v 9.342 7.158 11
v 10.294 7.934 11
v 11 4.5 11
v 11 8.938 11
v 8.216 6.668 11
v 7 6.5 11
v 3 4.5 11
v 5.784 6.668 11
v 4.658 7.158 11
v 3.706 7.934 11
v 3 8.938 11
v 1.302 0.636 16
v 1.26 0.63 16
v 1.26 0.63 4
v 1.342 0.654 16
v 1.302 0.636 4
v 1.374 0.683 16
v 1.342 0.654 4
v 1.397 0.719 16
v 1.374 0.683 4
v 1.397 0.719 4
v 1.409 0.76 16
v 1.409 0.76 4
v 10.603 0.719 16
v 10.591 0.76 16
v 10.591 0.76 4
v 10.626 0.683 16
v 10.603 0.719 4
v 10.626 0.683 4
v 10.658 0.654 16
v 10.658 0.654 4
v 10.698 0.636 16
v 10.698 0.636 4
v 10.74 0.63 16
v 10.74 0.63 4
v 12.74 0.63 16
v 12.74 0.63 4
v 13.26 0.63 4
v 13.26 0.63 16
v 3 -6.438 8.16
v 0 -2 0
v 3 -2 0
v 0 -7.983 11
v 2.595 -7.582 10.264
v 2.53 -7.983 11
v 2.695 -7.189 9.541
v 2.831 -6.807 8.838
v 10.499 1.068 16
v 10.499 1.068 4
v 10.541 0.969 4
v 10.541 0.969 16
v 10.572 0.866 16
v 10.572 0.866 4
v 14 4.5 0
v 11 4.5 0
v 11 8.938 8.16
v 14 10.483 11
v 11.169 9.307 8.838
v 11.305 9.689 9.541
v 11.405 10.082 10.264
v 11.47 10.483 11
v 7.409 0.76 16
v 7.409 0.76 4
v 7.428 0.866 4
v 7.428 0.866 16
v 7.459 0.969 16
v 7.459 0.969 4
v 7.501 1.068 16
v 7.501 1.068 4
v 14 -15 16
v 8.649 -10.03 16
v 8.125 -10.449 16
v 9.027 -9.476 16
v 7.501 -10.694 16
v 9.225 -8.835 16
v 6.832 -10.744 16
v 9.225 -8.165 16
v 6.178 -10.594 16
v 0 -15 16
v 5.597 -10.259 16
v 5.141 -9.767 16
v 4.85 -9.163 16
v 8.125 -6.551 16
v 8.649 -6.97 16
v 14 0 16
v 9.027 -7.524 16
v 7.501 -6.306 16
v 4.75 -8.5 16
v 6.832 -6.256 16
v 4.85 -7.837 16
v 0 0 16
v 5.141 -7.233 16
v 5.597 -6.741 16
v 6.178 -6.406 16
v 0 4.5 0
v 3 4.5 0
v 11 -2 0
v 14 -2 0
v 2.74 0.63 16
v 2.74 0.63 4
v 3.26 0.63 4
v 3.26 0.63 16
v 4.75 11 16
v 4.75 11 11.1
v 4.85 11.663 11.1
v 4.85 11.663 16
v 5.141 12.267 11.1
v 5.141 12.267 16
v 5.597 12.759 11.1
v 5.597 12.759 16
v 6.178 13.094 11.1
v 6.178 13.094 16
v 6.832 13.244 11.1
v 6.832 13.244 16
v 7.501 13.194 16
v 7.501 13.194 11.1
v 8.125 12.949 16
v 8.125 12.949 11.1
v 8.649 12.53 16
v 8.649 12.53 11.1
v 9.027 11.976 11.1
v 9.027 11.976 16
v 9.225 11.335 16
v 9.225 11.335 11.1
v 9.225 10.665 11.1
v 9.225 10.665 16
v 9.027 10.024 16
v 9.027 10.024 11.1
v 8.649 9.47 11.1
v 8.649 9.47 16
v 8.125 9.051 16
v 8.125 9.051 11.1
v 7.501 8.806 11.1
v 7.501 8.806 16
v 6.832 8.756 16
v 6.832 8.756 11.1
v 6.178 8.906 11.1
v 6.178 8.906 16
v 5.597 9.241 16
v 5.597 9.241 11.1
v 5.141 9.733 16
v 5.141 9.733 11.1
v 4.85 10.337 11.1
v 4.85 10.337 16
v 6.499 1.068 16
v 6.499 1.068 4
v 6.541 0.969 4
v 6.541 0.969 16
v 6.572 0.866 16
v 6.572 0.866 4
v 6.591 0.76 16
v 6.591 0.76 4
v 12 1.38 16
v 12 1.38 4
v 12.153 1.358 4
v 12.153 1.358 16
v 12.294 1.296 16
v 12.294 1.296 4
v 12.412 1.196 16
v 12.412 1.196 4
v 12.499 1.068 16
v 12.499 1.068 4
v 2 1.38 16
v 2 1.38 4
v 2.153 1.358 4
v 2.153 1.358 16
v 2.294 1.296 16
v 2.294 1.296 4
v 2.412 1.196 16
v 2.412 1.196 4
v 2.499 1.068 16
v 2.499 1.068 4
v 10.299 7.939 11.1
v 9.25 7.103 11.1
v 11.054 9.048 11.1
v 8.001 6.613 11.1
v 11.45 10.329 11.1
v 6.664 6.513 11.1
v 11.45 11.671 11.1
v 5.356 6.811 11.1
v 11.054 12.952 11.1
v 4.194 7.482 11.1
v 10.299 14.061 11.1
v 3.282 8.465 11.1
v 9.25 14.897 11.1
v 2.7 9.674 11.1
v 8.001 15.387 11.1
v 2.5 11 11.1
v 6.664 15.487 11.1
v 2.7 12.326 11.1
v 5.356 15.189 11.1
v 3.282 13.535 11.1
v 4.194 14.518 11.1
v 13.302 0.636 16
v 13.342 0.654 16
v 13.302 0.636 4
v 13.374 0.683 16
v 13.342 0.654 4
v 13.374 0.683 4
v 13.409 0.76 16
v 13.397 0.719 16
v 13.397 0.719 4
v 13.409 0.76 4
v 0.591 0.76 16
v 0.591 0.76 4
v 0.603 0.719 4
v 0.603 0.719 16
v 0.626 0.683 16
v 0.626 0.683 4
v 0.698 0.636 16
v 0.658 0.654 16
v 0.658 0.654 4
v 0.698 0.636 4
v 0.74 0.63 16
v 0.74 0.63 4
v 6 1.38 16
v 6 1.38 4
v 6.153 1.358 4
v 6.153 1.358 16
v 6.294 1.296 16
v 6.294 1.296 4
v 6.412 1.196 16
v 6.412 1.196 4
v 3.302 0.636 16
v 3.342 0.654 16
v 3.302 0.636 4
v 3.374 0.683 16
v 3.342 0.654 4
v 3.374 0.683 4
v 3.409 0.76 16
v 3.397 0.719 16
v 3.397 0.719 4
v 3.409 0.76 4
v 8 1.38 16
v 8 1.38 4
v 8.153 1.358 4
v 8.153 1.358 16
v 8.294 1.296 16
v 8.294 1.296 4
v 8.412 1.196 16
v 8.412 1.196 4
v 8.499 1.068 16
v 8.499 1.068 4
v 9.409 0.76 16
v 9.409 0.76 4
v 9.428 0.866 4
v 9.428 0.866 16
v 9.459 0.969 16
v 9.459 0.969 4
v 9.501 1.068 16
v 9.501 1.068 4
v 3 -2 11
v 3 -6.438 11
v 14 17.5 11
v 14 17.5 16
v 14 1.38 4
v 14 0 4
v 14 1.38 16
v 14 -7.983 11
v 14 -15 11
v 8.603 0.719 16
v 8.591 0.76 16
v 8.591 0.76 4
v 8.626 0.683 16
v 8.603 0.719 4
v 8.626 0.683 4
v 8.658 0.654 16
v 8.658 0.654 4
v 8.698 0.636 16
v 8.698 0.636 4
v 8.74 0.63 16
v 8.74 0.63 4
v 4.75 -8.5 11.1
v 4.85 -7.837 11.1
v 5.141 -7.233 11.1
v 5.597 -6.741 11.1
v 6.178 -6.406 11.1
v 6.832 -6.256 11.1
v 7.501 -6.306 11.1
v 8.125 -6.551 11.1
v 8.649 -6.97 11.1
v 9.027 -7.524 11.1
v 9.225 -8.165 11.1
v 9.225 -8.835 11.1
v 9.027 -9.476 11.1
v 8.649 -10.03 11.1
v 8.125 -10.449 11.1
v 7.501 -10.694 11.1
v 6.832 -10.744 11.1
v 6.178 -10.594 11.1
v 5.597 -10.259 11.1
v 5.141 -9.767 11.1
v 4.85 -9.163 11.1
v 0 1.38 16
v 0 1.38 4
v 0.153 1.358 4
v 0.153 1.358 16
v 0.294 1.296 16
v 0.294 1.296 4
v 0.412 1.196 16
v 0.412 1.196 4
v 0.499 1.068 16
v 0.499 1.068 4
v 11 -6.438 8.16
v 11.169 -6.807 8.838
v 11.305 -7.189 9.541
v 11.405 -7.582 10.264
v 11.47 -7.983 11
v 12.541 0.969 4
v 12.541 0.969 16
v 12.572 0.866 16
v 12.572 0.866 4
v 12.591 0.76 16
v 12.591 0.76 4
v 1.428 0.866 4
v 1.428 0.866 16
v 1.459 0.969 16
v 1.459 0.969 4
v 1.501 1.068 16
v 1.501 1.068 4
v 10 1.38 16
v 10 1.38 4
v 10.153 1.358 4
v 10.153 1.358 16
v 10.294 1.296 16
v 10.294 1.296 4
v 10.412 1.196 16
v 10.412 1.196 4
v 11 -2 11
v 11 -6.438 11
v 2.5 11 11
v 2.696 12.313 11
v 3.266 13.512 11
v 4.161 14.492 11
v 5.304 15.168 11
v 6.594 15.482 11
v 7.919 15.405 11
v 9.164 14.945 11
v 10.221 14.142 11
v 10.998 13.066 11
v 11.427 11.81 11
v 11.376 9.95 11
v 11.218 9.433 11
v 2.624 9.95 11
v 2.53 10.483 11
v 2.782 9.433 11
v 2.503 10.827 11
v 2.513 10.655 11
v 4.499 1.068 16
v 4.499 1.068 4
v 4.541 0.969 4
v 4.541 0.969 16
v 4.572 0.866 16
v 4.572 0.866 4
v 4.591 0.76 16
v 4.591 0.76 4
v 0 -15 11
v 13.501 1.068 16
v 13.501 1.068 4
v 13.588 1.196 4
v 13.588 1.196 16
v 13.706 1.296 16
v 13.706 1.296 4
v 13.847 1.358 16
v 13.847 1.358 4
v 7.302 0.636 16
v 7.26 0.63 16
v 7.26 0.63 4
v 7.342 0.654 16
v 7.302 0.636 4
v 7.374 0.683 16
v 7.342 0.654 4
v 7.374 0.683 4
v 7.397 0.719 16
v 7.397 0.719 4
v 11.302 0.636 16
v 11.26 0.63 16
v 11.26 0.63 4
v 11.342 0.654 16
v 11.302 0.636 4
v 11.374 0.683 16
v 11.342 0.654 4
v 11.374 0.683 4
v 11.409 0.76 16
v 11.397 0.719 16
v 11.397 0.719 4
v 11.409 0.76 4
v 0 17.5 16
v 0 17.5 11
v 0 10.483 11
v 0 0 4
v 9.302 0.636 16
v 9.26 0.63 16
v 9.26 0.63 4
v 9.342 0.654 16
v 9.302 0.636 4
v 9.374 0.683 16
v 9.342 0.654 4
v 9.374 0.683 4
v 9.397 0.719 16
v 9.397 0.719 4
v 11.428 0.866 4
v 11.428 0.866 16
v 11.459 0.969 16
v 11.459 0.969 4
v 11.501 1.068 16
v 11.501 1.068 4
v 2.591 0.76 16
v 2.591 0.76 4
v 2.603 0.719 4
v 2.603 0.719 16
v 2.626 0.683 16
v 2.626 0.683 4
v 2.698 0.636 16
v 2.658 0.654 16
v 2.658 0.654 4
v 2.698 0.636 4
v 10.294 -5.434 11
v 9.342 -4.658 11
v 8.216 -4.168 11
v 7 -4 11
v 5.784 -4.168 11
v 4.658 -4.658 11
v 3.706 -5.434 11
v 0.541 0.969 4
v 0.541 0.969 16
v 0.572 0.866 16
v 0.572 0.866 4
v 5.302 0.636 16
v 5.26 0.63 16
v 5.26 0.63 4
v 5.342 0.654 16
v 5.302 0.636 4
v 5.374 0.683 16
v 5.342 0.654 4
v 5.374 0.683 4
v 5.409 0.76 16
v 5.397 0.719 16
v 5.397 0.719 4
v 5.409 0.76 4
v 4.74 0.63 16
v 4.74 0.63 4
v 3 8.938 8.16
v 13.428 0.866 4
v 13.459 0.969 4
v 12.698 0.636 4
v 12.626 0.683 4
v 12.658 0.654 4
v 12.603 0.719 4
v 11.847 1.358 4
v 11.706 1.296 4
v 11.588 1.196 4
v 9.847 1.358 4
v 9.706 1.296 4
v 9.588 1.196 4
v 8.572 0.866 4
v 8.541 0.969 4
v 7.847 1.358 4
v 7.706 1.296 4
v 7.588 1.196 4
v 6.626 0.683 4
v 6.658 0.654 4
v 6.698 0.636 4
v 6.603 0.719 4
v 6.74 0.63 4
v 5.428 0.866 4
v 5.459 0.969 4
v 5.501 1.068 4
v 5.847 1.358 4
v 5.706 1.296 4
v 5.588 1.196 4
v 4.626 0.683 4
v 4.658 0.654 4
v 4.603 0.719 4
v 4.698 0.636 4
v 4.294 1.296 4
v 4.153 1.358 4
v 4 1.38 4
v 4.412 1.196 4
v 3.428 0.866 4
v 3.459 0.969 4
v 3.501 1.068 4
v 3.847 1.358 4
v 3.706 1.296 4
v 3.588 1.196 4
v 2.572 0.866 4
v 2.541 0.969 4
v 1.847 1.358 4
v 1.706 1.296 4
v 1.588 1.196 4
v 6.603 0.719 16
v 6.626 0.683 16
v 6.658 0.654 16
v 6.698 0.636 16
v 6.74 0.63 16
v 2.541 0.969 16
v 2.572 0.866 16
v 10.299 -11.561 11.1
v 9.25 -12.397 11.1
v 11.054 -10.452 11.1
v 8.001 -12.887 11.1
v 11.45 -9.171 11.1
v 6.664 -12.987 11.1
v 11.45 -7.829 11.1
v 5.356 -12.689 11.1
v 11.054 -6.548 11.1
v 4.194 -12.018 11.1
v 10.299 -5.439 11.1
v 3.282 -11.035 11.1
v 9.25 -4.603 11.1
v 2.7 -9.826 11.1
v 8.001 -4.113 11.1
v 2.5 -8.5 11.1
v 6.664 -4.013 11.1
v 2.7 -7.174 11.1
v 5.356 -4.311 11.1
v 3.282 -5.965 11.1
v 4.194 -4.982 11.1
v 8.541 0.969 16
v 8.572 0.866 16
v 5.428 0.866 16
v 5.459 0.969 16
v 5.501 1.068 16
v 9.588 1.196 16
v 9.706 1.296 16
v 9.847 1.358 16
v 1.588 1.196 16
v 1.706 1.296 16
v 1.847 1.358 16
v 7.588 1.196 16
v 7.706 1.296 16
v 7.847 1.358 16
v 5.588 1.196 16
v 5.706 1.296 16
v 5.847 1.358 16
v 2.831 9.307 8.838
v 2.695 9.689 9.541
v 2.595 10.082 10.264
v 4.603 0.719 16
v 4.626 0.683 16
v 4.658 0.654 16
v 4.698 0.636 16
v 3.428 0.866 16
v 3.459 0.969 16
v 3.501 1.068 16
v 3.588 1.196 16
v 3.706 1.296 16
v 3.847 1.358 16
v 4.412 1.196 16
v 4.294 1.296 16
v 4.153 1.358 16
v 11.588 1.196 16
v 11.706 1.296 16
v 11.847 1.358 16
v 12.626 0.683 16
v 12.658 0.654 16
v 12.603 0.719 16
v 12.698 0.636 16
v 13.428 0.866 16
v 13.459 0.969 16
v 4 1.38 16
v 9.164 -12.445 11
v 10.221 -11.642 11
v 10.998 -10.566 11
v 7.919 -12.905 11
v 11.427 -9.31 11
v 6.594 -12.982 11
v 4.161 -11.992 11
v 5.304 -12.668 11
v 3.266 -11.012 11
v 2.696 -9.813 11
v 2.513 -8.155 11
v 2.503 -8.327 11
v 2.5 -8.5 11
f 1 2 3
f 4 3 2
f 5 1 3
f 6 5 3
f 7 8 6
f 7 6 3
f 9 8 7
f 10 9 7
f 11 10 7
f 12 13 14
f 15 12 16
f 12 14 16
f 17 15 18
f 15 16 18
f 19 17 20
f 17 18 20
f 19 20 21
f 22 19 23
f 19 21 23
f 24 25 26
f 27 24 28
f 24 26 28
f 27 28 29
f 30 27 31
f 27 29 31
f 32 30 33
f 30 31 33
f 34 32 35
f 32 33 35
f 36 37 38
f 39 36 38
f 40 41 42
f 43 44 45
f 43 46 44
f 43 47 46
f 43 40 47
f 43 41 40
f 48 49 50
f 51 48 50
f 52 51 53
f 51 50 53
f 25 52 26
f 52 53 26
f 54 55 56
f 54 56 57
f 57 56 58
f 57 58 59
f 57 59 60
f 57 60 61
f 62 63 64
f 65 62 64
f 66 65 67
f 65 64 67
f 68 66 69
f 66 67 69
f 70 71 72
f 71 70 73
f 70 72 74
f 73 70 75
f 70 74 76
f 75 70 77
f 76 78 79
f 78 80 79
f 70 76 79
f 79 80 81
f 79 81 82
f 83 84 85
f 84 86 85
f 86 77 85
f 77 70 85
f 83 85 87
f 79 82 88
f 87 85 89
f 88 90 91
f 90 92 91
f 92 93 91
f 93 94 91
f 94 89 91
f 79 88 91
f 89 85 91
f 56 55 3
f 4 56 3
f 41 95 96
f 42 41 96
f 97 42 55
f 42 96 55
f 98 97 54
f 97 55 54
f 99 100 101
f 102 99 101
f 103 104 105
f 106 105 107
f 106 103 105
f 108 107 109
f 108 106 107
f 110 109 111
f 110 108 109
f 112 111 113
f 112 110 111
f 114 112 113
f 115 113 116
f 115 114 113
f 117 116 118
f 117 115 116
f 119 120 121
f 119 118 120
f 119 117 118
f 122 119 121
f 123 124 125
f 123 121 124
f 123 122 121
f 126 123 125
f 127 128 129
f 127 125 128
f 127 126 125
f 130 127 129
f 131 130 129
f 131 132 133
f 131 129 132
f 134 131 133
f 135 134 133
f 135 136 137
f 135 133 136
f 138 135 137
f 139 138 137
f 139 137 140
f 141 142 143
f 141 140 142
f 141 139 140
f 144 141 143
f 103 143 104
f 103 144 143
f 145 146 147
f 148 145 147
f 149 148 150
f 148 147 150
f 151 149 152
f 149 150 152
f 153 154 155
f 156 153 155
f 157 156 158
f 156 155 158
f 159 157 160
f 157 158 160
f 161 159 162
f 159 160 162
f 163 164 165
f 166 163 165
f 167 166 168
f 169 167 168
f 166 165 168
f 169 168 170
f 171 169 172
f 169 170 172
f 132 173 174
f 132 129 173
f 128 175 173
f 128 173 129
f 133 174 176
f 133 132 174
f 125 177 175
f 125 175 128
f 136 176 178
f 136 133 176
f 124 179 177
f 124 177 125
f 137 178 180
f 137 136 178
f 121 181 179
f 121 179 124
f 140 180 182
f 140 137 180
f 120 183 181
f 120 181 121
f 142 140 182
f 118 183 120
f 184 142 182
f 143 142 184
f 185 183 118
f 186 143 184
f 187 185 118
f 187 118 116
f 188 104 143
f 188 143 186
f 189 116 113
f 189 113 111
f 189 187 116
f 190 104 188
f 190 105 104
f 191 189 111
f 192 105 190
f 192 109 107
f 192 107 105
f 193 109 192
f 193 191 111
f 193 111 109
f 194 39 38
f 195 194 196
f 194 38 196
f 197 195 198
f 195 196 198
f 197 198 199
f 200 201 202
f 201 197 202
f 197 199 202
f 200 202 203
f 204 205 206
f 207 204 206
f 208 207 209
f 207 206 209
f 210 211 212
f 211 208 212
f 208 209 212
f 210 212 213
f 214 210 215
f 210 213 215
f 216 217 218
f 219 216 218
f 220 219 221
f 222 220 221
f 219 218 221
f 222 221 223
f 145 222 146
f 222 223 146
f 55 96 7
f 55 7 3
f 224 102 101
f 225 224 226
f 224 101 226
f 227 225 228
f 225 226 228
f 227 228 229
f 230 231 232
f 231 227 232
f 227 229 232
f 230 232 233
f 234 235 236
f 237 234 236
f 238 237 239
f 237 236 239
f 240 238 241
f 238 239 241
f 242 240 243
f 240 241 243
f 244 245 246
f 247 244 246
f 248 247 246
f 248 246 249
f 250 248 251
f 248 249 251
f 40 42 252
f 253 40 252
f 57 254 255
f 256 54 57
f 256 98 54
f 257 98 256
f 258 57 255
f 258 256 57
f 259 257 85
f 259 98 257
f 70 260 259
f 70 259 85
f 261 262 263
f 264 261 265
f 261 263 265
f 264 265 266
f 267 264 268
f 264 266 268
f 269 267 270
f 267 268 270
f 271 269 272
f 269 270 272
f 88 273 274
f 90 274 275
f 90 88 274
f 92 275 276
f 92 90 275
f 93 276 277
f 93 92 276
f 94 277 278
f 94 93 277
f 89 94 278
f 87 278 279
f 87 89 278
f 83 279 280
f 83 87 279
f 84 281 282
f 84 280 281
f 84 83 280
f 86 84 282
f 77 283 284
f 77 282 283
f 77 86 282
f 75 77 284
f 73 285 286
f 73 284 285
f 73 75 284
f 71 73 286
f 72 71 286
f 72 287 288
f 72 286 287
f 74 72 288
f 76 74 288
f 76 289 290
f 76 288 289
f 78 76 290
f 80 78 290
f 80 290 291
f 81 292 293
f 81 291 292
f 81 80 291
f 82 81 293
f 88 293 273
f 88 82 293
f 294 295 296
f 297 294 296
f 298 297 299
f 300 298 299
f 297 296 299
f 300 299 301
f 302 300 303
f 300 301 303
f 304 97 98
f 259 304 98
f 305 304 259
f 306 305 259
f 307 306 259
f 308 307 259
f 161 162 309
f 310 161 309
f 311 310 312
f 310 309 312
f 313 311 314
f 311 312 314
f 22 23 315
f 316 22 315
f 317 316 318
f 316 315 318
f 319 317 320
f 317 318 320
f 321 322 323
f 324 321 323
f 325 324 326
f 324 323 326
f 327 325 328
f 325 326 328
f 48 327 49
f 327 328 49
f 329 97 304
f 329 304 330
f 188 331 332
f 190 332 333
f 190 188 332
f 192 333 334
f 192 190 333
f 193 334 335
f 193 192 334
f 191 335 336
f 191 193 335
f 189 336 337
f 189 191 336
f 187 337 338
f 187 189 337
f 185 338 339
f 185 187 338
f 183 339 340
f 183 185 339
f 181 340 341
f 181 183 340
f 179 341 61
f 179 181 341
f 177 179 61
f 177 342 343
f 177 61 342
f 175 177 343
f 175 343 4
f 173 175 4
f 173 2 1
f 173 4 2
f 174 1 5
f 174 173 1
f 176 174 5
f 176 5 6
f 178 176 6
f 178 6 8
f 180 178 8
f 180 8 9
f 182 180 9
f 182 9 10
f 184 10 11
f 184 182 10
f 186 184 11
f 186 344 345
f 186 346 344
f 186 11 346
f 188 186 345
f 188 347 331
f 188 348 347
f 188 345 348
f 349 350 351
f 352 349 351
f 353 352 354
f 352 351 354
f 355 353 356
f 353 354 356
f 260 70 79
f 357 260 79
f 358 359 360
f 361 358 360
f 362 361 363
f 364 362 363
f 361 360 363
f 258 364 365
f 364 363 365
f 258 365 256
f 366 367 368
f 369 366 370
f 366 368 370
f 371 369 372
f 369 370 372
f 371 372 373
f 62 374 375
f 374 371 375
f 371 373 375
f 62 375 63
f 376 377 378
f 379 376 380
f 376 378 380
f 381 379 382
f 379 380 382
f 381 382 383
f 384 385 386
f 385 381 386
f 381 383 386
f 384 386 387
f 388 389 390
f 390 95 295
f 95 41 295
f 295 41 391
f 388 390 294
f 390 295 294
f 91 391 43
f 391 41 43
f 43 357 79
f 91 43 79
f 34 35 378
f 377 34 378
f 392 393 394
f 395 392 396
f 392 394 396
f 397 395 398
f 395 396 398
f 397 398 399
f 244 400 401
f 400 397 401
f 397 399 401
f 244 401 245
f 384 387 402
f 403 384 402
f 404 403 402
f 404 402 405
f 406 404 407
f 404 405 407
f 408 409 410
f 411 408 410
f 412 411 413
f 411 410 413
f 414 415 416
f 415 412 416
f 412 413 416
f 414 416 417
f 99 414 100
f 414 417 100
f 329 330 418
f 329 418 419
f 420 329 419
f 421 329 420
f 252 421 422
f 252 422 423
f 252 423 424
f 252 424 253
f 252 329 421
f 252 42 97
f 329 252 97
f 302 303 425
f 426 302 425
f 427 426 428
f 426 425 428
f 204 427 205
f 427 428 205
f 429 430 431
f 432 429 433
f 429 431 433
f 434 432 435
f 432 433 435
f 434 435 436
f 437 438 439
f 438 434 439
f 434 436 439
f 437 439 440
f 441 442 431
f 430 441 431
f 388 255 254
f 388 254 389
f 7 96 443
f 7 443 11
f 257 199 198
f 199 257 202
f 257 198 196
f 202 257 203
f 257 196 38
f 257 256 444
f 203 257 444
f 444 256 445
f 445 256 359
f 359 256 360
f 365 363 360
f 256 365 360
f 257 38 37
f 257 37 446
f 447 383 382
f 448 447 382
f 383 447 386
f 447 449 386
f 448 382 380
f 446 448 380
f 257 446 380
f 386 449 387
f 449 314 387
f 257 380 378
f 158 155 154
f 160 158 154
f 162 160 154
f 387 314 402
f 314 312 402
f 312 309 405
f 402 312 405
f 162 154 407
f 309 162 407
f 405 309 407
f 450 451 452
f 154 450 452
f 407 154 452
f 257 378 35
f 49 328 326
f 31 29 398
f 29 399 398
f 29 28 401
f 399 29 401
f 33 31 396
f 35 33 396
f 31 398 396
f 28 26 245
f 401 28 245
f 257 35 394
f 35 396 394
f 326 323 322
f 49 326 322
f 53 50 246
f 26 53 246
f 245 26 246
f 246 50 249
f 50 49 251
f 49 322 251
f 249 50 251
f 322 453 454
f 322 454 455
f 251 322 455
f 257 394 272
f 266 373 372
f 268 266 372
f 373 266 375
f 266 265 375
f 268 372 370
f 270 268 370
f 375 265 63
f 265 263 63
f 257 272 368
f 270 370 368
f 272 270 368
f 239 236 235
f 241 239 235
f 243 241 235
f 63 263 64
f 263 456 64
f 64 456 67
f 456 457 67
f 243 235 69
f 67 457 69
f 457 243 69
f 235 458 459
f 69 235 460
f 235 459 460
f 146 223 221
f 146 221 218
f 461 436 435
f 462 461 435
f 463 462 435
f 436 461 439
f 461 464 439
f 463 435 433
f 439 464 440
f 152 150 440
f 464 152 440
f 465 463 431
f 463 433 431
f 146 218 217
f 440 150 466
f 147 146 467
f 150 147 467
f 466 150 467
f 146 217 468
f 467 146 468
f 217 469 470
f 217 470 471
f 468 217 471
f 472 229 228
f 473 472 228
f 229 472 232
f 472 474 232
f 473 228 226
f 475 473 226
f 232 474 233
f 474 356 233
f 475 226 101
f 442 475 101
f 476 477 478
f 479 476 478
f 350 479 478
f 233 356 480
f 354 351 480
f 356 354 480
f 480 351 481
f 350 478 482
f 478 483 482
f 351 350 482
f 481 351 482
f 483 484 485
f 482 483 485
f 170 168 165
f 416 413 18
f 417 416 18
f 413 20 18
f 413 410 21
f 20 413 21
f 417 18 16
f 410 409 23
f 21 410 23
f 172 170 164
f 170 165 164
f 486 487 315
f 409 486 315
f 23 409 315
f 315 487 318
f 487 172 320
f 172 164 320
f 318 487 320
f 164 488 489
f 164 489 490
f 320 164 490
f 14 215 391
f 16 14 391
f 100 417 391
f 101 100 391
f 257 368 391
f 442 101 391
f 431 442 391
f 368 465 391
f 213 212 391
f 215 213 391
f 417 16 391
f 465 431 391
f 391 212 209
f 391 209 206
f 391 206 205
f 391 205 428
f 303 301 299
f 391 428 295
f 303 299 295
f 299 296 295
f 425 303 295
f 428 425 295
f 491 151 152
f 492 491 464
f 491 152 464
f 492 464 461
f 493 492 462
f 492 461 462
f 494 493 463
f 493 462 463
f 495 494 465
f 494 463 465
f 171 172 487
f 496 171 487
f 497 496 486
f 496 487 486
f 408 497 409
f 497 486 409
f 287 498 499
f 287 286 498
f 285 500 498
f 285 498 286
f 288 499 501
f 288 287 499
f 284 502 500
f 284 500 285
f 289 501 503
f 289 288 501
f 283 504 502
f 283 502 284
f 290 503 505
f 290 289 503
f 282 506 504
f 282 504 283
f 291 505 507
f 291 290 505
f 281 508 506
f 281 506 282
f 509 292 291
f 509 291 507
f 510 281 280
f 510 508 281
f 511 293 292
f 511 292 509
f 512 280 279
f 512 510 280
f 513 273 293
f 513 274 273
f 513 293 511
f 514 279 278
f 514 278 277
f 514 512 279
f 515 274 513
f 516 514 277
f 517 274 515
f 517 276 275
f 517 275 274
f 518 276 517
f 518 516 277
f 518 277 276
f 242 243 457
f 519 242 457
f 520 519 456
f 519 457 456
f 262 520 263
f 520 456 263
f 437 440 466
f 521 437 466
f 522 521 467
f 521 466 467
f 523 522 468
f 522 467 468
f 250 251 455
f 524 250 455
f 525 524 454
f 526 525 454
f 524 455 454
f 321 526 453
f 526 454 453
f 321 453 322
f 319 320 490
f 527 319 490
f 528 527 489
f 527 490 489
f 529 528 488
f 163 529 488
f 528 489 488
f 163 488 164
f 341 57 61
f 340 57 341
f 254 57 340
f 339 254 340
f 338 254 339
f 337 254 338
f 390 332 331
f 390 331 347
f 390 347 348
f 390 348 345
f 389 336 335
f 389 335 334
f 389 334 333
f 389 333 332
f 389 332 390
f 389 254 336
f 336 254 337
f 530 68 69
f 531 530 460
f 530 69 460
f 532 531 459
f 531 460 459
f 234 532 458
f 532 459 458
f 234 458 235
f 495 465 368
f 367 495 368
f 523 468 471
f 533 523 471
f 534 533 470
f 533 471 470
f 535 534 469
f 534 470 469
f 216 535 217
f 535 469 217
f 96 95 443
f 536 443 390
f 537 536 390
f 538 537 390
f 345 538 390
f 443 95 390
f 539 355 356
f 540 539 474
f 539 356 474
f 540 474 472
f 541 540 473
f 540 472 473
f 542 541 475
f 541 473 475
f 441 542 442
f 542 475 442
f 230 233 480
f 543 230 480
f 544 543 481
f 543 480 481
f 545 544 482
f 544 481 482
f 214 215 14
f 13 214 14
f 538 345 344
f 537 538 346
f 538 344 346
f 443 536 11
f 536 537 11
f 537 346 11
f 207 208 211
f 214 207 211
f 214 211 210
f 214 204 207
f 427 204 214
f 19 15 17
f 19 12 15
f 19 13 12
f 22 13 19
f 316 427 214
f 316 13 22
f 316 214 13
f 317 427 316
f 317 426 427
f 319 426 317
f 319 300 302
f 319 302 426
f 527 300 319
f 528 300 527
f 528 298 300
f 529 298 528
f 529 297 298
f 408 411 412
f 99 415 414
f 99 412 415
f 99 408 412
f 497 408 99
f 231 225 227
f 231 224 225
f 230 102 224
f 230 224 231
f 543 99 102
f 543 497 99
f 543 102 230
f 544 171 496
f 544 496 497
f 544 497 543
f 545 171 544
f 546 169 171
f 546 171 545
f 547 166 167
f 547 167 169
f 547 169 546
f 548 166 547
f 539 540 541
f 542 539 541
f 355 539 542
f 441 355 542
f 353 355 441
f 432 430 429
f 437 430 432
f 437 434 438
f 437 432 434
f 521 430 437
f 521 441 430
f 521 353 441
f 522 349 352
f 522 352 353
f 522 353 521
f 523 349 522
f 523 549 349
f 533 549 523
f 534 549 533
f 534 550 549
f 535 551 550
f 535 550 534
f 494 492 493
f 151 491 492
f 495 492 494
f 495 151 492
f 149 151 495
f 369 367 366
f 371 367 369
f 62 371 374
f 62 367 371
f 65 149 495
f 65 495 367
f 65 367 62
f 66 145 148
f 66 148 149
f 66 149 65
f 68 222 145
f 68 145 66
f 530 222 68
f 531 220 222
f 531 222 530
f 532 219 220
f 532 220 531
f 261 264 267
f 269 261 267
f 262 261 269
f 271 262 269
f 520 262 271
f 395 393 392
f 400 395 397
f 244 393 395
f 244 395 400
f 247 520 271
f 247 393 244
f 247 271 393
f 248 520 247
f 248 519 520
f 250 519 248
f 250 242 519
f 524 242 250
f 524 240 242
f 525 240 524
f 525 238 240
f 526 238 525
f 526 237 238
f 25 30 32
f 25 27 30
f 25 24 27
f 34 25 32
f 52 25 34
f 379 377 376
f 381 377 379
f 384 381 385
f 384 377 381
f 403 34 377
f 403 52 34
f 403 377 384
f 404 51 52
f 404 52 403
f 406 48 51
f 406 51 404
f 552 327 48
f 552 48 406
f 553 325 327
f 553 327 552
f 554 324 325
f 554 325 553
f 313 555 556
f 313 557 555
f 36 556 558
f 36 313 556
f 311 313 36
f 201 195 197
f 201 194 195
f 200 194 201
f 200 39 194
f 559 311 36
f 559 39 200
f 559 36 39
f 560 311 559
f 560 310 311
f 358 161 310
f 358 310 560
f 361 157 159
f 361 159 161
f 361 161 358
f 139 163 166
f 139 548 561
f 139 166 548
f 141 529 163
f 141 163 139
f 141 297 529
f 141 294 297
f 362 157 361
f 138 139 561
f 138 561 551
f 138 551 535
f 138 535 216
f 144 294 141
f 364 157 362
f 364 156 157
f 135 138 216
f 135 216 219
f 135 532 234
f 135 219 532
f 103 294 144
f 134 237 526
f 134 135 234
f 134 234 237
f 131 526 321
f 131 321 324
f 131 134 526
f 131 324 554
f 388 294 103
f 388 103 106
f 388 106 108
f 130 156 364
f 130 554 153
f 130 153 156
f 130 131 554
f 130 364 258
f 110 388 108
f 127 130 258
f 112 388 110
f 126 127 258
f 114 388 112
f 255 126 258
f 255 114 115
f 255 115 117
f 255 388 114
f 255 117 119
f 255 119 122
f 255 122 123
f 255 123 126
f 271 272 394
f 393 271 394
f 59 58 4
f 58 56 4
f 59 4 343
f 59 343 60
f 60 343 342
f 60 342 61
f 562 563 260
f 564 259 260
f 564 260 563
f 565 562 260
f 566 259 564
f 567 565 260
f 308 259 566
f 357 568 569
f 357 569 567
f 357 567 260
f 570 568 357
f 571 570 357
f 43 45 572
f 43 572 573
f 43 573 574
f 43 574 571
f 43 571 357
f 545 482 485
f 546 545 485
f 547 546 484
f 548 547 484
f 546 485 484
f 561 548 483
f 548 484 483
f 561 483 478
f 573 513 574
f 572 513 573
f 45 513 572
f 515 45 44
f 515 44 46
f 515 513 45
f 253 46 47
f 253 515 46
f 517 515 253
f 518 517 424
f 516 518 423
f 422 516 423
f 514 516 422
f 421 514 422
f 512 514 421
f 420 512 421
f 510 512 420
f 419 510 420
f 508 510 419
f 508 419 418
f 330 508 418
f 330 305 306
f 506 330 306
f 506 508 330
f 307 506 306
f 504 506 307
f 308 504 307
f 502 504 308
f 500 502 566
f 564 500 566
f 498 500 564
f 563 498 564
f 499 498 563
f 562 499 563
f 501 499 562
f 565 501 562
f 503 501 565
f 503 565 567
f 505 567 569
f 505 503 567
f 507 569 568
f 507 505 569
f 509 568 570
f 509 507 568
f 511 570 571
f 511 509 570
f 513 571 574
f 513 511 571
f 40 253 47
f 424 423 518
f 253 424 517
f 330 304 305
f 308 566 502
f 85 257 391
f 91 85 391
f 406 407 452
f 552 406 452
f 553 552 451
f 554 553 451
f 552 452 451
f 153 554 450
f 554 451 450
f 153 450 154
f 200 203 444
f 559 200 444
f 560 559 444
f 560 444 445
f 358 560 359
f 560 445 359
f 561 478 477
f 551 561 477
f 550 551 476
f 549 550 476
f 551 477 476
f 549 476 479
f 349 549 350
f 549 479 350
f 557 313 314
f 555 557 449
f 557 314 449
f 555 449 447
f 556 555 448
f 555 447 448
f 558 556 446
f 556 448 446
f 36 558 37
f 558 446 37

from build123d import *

# Parameters (mm, degrees)
SKETCH3_W           = 14
SKETCH3_H           = 6.5
BOSS_EXTRUDE2_DEPTH = 16
CUT_EXTRUDE1_START  = 4
CUT_EXTRUDE1_DEPTH  = 19
LPATTERN2_COUNT     = 7
LPATTERN2_PITCH     = 2
SKETCH4_W           = 14
SKETCH4_H           = 13
SKETCH4_R           = 2.25
BOSS_EXTRUDE3_DEPTH = 5
BOSS_EXTRUDE4_DEPTH = 3
BOSS_EXTRUDE5_START = -11
BOSS_EXTRUDE5_DEPTH = 3
CUT_EXTRUDE2_START  = -0.1
SKETCH5_R           = 4.5
CUT_EXTRUDE2_DEPTH  = 10.1


with BuildPart() as part:
    # Sketch3 → Boss-Extrude2 (new body)
    with BuildSketch(Plane.XY):
        with Locations((7, 1.25)):
            Rectangle(SKETCH3_W, SKETCH3_H)
    extrude(amount=BOSS_EXTRUDE2_DEPTH)

    # Sketch1 → Cut-Extrude1 (cut)
    with BuildSketch(Plane.XY.offset(CUT_EXTRUDE1_START)):
        with BuildLine():
            Line((0.740175425, 0.63), (1.259824575, 0.63))
            ThreePointArc((1.259824575, 0.63), (1.358731646, 0.667228588), (1.408543109, 0.760434783))
            ThreePointArc((1.408543109, 0.760434783), (1.442388286, 0.918062154), (1.501123596, 1.068202247))
            ThreePointArc((1.501123596, 1.068202247), (1.705850588, 1.295639059), (2, 1.38))
            Line((2, 1.38), (2, 0))
            Line((2, 0), (0, 0))
            Line((0, 0), (0, 1.38))
            ThreePointArc((0, 1.38), (0.294149412, 1.295639059), (0.498876404, 1.068202247))
            ThreePointArc((0.498876404, 1.068202247), (0.557611714, 0.918062154), (0.591456891, 0.760434783))
            ThreePointArc((0.591456891, 0.760434783), (0.641268354, 0.667228588), (0.740175425, 0.63))
        make_face()
    cut_extrude1 = extrude(amount=CUT_EXTRUDE1_DEPTH, mode=Mode.SUBTRACT)

    # LPattern2: Cut-Extrude1 ×7
    with Locations(*[(i * LPATTERN2_PITCH, 0, 0) for i in range(1, LPATTERN2_COUNT)]):
        add(cut_extrude1, mode=Mode.SUBTRACT)

    # Sketch4 → Boss-Extrude3 (add)
    # profile 1 of 2: a face of its own
    with BuildSketch(Plane(origin=(0, 4.5, 16), x_dir=(-1, 0, 0), z_dir=(0, 0, -1))):
        with Locations((-7, -13)):
            Rectangle(SKETCH4_W, SKETCH4_H)
        with Locations((-7, -13)):
            Circle(SKETCH4_R, mode=Mode.SUBTRACT)
    # profile 2 of 2: a face of its own
    with BuildSketch(Plane(origin=(0, 4.5, 16), x_dir=(-1, 0, 0), z_dir=(0, 0, -1))):
        with Locations((-7, 6.5)):
            Rectangle(SKETCH4_W, SKETCH4_H)
        with Locations((-7, 6.5)):
            Circle(SKETCH4_R, mode=Mode.SUBTRACT)
    extrude(amount=BOSS_EXTRUDE3_DEPTH)

    # Sketch7 → Boss-Extrude4 (add)
    with BuildSketch(Plane.ZY):
        Polygon((0, -2), (11, -7.982839213), (11, -2), align=None)
    boss_extrude4 = extrude(amount=-BOSS_EXTRUDE4_DEPTH)

    # Sketch7<2> → Boss-Extrude5 (add)
    with BuildSketch(Plane.ZY.offset(BOSS_EXTRUDE5_START)):
        Polygon((0, -2), (11, -7.982839213), (11, -2), align=None)
    boss_extrude5 = extrude(amount=-BOSS_EXTRUDE5_DEPTH)

    # Sketch5 → Cut-Extrude2 (cut)
    with BuildSketch(Plane(origin=(0, 0, 11), x_dir=(-1, 0, 0), z_dir=(0, 0, -1)).offset(CUT_EXTRUDE2_START)):
        with Locations((-7, 11)):
            Circle(SKETCH5_R)
        with Locations((-7, -8.5)):
            Circle(SKETCH5_R)
    cut_extrude2 = extrude(amount=CUT_EXTRUDE2_DEPTH, mode=Mode.SUBTRACT)

    # Mirror1: Boss-Extrude4, Boss-Extrude5, Cut-Extrude2 across plane
    add(boss_extrude4.mirror(Plane.ZX.offset(1.25)))
    add(boss_extrude5.mirror(Plane.ZX.offset(1.25)))
    add(cut_extrude2.mirror(Plane.ZX.offset(1.25)), mode=Mode.SUBTRACT)


solid = part.part
